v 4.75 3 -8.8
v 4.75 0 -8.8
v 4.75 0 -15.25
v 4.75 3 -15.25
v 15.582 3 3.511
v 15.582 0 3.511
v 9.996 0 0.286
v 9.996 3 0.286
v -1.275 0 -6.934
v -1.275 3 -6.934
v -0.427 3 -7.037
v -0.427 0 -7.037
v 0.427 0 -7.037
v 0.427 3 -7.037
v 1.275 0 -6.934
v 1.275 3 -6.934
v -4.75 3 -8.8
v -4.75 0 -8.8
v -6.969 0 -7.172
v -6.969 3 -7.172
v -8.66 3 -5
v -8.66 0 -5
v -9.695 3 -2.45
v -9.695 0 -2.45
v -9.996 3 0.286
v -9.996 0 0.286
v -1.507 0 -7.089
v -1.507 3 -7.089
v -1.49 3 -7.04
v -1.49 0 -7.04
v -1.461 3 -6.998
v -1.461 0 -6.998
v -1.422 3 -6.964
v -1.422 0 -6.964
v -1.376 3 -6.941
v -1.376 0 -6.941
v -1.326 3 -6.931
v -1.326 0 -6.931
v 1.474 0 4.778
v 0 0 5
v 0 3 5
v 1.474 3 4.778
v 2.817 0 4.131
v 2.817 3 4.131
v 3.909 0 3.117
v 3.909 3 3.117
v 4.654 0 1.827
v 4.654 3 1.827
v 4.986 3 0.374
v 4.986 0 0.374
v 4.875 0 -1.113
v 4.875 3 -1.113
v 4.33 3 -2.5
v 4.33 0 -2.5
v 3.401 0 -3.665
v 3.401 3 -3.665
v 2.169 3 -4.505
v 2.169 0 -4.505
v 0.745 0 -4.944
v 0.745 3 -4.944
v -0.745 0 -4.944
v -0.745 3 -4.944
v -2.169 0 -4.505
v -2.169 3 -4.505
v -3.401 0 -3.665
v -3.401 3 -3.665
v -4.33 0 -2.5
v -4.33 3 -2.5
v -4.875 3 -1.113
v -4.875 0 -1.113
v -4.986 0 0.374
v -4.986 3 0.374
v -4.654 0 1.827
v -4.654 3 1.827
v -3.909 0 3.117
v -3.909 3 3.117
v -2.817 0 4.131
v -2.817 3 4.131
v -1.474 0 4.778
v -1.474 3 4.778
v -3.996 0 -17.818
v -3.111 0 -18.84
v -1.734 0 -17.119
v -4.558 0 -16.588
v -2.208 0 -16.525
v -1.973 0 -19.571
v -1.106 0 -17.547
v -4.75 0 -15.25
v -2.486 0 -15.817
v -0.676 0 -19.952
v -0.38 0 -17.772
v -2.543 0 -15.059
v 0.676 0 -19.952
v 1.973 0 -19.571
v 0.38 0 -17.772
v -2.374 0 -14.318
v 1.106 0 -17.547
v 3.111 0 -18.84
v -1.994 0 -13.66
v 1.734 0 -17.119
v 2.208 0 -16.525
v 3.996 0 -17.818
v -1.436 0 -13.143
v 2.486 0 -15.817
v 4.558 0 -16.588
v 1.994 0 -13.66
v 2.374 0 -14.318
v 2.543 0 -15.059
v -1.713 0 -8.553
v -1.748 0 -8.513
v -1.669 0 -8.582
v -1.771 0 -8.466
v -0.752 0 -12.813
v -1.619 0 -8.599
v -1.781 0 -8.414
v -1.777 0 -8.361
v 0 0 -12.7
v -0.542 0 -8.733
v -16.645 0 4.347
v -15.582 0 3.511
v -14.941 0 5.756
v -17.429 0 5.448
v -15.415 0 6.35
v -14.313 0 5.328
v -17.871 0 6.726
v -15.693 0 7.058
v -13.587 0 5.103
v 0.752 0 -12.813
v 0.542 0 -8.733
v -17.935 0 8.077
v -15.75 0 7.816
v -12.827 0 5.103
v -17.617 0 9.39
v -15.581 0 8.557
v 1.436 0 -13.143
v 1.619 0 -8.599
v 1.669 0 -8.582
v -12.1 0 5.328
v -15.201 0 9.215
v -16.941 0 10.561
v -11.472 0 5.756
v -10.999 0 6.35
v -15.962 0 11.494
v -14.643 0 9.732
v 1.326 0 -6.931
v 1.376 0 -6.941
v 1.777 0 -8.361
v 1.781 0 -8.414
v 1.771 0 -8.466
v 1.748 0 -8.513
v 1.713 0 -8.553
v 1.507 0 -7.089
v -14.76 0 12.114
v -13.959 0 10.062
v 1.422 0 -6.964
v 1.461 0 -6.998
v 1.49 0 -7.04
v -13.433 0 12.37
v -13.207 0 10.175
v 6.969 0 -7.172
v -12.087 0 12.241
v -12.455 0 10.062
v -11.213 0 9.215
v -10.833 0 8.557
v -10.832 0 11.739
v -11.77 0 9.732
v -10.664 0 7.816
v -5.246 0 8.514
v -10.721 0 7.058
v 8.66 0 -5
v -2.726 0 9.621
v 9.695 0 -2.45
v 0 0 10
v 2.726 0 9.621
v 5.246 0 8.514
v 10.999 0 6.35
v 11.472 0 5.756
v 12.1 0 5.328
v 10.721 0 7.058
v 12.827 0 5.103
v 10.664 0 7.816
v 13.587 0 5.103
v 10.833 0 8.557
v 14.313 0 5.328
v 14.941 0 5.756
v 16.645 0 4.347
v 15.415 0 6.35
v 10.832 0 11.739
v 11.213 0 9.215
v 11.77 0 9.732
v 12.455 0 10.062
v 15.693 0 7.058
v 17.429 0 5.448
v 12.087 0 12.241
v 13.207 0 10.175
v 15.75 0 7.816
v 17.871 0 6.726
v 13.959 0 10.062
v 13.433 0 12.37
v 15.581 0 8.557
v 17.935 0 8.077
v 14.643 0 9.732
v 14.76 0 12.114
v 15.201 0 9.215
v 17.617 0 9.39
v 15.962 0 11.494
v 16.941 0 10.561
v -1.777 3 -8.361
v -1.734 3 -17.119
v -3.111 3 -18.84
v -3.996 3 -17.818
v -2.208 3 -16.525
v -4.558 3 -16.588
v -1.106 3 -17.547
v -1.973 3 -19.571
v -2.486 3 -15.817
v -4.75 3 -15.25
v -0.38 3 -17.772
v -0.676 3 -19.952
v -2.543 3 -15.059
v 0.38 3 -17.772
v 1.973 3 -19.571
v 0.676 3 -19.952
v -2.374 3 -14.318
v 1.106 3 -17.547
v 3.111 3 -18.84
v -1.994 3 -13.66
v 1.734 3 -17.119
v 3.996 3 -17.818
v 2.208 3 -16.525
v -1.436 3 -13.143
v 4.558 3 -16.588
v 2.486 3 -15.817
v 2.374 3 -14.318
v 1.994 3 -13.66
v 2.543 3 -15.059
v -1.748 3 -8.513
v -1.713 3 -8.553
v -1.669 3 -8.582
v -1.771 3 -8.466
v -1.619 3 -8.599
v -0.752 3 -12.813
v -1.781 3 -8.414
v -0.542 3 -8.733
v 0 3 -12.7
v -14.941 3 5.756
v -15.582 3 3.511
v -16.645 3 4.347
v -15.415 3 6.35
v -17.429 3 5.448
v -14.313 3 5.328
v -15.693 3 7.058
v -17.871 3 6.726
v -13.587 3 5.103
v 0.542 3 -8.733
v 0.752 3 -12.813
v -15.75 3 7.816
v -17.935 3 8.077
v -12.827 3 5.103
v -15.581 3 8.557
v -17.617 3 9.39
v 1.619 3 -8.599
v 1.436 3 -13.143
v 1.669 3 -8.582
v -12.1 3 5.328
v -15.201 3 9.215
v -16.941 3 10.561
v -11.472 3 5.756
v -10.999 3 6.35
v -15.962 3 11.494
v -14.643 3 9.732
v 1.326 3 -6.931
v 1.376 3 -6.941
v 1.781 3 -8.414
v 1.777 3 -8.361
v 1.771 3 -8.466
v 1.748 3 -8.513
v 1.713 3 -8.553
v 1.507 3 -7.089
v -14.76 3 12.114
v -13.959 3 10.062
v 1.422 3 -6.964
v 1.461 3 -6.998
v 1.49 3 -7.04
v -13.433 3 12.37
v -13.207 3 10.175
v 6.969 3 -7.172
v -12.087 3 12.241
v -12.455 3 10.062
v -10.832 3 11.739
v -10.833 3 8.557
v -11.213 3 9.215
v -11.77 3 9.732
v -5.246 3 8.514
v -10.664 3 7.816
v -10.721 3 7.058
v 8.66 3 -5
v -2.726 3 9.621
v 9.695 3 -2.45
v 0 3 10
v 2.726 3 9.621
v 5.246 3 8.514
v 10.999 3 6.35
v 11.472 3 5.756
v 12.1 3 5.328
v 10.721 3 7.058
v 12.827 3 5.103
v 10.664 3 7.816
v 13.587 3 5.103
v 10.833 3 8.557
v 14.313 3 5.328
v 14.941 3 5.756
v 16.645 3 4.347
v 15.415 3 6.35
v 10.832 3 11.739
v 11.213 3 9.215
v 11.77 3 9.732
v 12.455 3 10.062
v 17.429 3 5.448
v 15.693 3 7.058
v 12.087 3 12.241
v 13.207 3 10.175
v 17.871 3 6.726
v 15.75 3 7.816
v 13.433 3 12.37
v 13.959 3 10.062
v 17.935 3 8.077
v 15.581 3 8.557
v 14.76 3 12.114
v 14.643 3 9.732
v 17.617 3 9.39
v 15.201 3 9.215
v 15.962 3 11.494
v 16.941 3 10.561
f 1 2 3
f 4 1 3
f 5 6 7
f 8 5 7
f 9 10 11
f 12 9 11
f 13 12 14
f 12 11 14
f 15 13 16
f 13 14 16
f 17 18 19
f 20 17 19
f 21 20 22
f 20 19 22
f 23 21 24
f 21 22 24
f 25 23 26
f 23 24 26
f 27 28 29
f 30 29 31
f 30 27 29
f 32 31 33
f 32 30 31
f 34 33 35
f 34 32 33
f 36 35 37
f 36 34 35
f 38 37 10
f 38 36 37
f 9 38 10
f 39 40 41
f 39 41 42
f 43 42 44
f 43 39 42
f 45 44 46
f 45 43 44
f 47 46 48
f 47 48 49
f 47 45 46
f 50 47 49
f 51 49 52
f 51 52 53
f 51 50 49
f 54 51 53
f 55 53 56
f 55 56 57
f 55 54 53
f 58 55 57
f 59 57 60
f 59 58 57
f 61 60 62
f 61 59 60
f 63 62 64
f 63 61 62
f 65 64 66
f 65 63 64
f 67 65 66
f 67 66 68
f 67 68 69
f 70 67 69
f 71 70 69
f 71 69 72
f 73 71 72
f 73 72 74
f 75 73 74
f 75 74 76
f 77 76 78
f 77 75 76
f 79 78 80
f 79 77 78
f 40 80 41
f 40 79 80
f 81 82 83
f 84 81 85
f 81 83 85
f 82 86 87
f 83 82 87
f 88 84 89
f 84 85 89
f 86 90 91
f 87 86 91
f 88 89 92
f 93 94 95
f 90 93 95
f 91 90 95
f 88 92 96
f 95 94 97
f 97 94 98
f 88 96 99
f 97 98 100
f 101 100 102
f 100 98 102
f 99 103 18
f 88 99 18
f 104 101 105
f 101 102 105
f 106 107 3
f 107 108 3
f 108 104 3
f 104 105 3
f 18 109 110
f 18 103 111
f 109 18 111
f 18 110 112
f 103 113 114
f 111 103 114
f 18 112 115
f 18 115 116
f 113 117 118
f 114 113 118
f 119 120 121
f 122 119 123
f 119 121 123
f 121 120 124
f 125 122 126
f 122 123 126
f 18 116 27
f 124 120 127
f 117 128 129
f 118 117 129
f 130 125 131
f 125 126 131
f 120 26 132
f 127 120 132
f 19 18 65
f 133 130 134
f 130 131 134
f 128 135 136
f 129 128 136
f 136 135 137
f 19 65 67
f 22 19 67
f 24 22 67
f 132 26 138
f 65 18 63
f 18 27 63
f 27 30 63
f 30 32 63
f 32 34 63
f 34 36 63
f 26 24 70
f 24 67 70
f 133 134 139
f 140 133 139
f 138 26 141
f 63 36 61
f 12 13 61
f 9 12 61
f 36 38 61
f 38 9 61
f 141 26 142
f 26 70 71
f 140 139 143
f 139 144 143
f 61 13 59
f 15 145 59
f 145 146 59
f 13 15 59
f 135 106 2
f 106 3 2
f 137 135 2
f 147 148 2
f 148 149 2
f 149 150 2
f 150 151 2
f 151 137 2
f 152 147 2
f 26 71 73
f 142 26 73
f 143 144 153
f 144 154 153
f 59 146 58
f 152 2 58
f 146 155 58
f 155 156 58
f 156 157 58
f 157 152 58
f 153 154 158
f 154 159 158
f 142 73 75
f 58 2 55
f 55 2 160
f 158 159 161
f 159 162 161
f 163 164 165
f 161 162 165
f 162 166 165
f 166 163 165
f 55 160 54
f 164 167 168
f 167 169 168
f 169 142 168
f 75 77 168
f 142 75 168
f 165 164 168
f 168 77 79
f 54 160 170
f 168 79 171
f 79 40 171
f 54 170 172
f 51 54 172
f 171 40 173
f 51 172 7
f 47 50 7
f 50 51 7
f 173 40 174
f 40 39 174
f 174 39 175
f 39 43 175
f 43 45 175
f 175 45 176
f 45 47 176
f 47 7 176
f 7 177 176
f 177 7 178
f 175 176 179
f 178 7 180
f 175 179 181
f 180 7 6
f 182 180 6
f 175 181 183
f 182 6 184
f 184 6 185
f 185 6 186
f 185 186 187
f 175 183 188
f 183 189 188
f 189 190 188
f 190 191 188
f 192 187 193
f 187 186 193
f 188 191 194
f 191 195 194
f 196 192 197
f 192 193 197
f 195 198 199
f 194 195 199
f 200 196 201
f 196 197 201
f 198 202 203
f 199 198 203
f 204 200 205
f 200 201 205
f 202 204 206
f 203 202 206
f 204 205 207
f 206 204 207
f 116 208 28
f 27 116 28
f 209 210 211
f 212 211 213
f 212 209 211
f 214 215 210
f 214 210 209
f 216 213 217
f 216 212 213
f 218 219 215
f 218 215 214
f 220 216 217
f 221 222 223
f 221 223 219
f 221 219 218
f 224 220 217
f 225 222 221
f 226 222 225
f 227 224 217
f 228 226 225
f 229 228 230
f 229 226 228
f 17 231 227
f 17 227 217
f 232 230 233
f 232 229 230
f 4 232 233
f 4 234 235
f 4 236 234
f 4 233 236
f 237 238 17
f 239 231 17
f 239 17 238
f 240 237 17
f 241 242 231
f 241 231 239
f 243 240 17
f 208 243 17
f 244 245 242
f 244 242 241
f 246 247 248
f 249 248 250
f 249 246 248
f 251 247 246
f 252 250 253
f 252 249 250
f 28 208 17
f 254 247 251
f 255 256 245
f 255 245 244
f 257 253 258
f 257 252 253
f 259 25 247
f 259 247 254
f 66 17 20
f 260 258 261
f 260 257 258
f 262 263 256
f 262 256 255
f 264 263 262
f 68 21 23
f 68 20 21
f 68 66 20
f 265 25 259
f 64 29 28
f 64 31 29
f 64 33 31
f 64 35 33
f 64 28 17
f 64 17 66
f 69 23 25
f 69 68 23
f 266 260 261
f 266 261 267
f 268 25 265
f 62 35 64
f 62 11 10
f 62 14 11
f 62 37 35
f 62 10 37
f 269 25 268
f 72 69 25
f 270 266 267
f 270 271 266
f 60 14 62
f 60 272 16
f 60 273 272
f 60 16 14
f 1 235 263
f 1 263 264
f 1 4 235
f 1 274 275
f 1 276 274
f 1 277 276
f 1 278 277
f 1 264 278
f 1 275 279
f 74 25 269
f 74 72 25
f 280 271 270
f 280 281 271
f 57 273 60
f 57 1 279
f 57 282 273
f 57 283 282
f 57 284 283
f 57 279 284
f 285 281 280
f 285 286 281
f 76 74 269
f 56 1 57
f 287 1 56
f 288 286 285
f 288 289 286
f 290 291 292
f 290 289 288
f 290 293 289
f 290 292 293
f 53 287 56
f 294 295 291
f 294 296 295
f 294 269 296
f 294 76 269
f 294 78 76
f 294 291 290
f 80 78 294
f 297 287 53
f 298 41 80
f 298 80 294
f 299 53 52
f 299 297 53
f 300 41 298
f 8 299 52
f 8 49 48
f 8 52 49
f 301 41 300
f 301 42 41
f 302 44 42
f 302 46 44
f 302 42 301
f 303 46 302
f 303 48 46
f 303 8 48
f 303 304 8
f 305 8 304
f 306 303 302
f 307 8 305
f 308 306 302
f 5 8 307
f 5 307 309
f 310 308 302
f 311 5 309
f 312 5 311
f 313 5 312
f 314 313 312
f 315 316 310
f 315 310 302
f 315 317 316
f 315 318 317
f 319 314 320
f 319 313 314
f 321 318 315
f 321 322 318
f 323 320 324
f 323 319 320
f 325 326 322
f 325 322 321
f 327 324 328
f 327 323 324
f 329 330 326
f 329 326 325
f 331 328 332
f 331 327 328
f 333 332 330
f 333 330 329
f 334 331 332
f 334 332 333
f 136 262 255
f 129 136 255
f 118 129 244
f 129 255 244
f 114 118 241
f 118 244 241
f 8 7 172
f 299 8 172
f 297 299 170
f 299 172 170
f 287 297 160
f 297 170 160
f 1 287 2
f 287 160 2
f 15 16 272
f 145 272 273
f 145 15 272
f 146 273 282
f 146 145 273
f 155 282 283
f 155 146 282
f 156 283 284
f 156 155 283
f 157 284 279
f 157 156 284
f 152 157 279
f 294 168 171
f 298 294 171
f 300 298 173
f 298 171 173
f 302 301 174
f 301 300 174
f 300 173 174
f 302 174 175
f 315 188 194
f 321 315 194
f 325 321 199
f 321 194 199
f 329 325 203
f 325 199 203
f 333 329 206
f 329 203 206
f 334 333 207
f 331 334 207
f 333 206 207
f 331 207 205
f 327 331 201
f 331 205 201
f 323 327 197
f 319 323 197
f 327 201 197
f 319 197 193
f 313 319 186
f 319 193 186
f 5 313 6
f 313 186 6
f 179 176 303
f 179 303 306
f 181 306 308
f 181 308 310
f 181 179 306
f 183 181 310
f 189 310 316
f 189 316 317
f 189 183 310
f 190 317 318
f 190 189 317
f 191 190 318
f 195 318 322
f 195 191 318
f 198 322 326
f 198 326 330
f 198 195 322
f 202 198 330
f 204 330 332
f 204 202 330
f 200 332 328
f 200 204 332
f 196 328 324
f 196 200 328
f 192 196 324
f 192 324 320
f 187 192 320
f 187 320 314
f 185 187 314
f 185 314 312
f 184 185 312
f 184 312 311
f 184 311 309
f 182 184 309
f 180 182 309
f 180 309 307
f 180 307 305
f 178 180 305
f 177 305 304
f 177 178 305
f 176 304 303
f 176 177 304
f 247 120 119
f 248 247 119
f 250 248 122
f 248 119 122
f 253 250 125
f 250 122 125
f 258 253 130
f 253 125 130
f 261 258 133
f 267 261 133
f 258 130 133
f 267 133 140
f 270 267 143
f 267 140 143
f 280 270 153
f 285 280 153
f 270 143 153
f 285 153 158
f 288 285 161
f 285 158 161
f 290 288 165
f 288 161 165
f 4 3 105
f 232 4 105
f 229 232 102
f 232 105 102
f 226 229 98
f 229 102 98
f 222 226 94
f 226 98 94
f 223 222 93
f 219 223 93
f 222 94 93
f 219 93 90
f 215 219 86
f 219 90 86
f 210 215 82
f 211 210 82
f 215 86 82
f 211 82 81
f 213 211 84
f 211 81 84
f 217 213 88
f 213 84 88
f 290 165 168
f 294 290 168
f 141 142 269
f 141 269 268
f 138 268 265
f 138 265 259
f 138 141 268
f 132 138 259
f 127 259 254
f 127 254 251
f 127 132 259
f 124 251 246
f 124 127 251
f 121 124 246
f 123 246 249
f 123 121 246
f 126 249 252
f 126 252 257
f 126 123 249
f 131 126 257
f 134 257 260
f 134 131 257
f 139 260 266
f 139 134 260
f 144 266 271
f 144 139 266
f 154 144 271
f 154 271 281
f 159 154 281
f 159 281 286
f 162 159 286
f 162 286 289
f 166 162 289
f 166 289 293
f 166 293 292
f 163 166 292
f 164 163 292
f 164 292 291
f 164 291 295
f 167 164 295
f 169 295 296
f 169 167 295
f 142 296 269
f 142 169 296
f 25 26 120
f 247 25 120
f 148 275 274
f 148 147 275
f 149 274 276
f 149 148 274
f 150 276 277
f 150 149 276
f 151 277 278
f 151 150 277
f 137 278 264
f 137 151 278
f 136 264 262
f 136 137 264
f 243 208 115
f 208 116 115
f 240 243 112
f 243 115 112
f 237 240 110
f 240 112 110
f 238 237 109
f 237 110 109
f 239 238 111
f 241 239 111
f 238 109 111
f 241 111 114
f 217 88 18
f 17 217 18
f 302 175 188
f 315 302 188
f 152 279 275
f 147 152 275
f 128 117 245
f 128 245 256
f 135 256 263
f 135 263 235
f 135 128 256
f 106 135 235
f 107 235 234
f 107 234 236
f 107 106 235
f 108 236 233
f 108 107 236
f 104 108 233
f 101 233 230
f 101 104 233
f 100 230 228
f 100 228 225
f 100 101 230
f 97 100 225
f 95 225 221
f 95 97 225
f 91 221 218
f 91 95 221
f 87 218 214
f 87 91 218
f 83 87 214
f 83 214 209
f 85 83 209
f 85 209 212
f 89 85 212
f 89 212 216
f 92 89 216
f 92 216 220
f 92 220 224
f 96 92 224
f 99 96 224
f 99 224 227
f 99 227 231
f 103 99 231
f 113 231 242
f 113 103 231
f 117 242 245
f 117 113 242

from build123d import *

# Parameters (mm, degrees)
SKETCH1_R           = 10
SKETCH1_R_2         = 5
BOSS_EXTRUDE1_DEPTH = 3
BOSS_EXTRUDE2_START = -3
SKETCH2_R           = 2.55
BOSS_EXTRUDE2_DEPTH = 3
CIRPATTERN1_COUNT   = 3
CUT_EXTRUDE1_DEPTH  = 28.045328716
FILLET1_R           = 0.2


with BuildPart() as part:
    # Sketch1 → Boss-Extrude1 (new body)
    with BuildSketch(Plane(origin=(0, 0, 0), x_dir=(1, 0, 0), z_dir=(0, 1, 0))):
        with Locations(Location((0, 0, 0), (0, 0, 270))):
            Circle(SKETCH1_R)
        with Locations(Location((0, 0, 0), (0, 0, 270))):
            Circle(SKETCH1_R_2, mode=Mode.SUBTRACT)
    extrude(amount=BOSS_EXTRUDE1_DEPTH)

    # Sketch2 → Boss-Extrude2 (add)
    with BuildSketch(Plane(origin=(0, 3, 0), x_dir=(1, 0, 0), z_dir=(0, 1, 0)).offset(BOSS_EXTRUDE2_START)):
        with BuildLine():
            Line((-4.75, 15.25), (-4.75, 8.799857953))
            ThreePointArc((-4.75, 8.799857953), (0, 10), (4.75, 8.799857953))
            Line((4.75, 8.799857953), (4.75, 15.25))
            ThreePointArc((4.75, 15.25), (0, 20), (-4.75, 15.25))
        make_face()
        with Locations(Location((0, 15.25, 0), (0, 0, 270))):
            Circle(SKETCH2_R, mode=Mode.SUBTRACT)
    boss_extrude2 = extrude(amount=BOSS_EXTRUDE2_DEPTH)

    # CirPattern1: Boss-Extrude2 ×3 about axis
    cirpattern1_axis = Axis((0, 0, 0), (0, 1, 0))
    for i in range(1, CIRPATTERN1_COUNT):
        add(boss_extrude2.rotate(cirpattern1_axis, i * 360 / CIRPATTERN1_COUNT))

    # Sketch3 → Cut-Extrude1 (cut, through all)
    with BuildSketch(Plane(origin=(0, 3, 0), x_dir=(1, 0, 0), z_dir=(0, 1, 0))):
        with BuildLine():
            Line((-1.819227295, 8.558791506), (-1.46577742, 6.895940585))
            ThreePointArc((-1.46577742, 6.895940585), (0, 7.05), (1.46577742, 6.895940585))
            Line((1.46577742, 6.895940585), (1.819227295, 8.558791506))
            ThreePointArc((1.819227295, 8.558791506), (0, 8.75), (-1.819227295, 8.558791506))
        make_face()
    extrude(amount=-CUT_EXTRUDE1_DEPTH, mode=Mode.SUBTRACT)

    # Fillet1
    fillet1_edges = [part.edges().sort_by_distance(p)[0] for p in [
        (1.46577742, 1.5, -6.895940585),
        (-1.46577742, 1.5, -6.895940585),
        (-1.819227295, 1.5, -8.558791506),
        (1.819227295, 1.5, -8.558791506),
    ]]
    fillet(fillet1_edges, radius=FILLET1_R)


solid = part.part
